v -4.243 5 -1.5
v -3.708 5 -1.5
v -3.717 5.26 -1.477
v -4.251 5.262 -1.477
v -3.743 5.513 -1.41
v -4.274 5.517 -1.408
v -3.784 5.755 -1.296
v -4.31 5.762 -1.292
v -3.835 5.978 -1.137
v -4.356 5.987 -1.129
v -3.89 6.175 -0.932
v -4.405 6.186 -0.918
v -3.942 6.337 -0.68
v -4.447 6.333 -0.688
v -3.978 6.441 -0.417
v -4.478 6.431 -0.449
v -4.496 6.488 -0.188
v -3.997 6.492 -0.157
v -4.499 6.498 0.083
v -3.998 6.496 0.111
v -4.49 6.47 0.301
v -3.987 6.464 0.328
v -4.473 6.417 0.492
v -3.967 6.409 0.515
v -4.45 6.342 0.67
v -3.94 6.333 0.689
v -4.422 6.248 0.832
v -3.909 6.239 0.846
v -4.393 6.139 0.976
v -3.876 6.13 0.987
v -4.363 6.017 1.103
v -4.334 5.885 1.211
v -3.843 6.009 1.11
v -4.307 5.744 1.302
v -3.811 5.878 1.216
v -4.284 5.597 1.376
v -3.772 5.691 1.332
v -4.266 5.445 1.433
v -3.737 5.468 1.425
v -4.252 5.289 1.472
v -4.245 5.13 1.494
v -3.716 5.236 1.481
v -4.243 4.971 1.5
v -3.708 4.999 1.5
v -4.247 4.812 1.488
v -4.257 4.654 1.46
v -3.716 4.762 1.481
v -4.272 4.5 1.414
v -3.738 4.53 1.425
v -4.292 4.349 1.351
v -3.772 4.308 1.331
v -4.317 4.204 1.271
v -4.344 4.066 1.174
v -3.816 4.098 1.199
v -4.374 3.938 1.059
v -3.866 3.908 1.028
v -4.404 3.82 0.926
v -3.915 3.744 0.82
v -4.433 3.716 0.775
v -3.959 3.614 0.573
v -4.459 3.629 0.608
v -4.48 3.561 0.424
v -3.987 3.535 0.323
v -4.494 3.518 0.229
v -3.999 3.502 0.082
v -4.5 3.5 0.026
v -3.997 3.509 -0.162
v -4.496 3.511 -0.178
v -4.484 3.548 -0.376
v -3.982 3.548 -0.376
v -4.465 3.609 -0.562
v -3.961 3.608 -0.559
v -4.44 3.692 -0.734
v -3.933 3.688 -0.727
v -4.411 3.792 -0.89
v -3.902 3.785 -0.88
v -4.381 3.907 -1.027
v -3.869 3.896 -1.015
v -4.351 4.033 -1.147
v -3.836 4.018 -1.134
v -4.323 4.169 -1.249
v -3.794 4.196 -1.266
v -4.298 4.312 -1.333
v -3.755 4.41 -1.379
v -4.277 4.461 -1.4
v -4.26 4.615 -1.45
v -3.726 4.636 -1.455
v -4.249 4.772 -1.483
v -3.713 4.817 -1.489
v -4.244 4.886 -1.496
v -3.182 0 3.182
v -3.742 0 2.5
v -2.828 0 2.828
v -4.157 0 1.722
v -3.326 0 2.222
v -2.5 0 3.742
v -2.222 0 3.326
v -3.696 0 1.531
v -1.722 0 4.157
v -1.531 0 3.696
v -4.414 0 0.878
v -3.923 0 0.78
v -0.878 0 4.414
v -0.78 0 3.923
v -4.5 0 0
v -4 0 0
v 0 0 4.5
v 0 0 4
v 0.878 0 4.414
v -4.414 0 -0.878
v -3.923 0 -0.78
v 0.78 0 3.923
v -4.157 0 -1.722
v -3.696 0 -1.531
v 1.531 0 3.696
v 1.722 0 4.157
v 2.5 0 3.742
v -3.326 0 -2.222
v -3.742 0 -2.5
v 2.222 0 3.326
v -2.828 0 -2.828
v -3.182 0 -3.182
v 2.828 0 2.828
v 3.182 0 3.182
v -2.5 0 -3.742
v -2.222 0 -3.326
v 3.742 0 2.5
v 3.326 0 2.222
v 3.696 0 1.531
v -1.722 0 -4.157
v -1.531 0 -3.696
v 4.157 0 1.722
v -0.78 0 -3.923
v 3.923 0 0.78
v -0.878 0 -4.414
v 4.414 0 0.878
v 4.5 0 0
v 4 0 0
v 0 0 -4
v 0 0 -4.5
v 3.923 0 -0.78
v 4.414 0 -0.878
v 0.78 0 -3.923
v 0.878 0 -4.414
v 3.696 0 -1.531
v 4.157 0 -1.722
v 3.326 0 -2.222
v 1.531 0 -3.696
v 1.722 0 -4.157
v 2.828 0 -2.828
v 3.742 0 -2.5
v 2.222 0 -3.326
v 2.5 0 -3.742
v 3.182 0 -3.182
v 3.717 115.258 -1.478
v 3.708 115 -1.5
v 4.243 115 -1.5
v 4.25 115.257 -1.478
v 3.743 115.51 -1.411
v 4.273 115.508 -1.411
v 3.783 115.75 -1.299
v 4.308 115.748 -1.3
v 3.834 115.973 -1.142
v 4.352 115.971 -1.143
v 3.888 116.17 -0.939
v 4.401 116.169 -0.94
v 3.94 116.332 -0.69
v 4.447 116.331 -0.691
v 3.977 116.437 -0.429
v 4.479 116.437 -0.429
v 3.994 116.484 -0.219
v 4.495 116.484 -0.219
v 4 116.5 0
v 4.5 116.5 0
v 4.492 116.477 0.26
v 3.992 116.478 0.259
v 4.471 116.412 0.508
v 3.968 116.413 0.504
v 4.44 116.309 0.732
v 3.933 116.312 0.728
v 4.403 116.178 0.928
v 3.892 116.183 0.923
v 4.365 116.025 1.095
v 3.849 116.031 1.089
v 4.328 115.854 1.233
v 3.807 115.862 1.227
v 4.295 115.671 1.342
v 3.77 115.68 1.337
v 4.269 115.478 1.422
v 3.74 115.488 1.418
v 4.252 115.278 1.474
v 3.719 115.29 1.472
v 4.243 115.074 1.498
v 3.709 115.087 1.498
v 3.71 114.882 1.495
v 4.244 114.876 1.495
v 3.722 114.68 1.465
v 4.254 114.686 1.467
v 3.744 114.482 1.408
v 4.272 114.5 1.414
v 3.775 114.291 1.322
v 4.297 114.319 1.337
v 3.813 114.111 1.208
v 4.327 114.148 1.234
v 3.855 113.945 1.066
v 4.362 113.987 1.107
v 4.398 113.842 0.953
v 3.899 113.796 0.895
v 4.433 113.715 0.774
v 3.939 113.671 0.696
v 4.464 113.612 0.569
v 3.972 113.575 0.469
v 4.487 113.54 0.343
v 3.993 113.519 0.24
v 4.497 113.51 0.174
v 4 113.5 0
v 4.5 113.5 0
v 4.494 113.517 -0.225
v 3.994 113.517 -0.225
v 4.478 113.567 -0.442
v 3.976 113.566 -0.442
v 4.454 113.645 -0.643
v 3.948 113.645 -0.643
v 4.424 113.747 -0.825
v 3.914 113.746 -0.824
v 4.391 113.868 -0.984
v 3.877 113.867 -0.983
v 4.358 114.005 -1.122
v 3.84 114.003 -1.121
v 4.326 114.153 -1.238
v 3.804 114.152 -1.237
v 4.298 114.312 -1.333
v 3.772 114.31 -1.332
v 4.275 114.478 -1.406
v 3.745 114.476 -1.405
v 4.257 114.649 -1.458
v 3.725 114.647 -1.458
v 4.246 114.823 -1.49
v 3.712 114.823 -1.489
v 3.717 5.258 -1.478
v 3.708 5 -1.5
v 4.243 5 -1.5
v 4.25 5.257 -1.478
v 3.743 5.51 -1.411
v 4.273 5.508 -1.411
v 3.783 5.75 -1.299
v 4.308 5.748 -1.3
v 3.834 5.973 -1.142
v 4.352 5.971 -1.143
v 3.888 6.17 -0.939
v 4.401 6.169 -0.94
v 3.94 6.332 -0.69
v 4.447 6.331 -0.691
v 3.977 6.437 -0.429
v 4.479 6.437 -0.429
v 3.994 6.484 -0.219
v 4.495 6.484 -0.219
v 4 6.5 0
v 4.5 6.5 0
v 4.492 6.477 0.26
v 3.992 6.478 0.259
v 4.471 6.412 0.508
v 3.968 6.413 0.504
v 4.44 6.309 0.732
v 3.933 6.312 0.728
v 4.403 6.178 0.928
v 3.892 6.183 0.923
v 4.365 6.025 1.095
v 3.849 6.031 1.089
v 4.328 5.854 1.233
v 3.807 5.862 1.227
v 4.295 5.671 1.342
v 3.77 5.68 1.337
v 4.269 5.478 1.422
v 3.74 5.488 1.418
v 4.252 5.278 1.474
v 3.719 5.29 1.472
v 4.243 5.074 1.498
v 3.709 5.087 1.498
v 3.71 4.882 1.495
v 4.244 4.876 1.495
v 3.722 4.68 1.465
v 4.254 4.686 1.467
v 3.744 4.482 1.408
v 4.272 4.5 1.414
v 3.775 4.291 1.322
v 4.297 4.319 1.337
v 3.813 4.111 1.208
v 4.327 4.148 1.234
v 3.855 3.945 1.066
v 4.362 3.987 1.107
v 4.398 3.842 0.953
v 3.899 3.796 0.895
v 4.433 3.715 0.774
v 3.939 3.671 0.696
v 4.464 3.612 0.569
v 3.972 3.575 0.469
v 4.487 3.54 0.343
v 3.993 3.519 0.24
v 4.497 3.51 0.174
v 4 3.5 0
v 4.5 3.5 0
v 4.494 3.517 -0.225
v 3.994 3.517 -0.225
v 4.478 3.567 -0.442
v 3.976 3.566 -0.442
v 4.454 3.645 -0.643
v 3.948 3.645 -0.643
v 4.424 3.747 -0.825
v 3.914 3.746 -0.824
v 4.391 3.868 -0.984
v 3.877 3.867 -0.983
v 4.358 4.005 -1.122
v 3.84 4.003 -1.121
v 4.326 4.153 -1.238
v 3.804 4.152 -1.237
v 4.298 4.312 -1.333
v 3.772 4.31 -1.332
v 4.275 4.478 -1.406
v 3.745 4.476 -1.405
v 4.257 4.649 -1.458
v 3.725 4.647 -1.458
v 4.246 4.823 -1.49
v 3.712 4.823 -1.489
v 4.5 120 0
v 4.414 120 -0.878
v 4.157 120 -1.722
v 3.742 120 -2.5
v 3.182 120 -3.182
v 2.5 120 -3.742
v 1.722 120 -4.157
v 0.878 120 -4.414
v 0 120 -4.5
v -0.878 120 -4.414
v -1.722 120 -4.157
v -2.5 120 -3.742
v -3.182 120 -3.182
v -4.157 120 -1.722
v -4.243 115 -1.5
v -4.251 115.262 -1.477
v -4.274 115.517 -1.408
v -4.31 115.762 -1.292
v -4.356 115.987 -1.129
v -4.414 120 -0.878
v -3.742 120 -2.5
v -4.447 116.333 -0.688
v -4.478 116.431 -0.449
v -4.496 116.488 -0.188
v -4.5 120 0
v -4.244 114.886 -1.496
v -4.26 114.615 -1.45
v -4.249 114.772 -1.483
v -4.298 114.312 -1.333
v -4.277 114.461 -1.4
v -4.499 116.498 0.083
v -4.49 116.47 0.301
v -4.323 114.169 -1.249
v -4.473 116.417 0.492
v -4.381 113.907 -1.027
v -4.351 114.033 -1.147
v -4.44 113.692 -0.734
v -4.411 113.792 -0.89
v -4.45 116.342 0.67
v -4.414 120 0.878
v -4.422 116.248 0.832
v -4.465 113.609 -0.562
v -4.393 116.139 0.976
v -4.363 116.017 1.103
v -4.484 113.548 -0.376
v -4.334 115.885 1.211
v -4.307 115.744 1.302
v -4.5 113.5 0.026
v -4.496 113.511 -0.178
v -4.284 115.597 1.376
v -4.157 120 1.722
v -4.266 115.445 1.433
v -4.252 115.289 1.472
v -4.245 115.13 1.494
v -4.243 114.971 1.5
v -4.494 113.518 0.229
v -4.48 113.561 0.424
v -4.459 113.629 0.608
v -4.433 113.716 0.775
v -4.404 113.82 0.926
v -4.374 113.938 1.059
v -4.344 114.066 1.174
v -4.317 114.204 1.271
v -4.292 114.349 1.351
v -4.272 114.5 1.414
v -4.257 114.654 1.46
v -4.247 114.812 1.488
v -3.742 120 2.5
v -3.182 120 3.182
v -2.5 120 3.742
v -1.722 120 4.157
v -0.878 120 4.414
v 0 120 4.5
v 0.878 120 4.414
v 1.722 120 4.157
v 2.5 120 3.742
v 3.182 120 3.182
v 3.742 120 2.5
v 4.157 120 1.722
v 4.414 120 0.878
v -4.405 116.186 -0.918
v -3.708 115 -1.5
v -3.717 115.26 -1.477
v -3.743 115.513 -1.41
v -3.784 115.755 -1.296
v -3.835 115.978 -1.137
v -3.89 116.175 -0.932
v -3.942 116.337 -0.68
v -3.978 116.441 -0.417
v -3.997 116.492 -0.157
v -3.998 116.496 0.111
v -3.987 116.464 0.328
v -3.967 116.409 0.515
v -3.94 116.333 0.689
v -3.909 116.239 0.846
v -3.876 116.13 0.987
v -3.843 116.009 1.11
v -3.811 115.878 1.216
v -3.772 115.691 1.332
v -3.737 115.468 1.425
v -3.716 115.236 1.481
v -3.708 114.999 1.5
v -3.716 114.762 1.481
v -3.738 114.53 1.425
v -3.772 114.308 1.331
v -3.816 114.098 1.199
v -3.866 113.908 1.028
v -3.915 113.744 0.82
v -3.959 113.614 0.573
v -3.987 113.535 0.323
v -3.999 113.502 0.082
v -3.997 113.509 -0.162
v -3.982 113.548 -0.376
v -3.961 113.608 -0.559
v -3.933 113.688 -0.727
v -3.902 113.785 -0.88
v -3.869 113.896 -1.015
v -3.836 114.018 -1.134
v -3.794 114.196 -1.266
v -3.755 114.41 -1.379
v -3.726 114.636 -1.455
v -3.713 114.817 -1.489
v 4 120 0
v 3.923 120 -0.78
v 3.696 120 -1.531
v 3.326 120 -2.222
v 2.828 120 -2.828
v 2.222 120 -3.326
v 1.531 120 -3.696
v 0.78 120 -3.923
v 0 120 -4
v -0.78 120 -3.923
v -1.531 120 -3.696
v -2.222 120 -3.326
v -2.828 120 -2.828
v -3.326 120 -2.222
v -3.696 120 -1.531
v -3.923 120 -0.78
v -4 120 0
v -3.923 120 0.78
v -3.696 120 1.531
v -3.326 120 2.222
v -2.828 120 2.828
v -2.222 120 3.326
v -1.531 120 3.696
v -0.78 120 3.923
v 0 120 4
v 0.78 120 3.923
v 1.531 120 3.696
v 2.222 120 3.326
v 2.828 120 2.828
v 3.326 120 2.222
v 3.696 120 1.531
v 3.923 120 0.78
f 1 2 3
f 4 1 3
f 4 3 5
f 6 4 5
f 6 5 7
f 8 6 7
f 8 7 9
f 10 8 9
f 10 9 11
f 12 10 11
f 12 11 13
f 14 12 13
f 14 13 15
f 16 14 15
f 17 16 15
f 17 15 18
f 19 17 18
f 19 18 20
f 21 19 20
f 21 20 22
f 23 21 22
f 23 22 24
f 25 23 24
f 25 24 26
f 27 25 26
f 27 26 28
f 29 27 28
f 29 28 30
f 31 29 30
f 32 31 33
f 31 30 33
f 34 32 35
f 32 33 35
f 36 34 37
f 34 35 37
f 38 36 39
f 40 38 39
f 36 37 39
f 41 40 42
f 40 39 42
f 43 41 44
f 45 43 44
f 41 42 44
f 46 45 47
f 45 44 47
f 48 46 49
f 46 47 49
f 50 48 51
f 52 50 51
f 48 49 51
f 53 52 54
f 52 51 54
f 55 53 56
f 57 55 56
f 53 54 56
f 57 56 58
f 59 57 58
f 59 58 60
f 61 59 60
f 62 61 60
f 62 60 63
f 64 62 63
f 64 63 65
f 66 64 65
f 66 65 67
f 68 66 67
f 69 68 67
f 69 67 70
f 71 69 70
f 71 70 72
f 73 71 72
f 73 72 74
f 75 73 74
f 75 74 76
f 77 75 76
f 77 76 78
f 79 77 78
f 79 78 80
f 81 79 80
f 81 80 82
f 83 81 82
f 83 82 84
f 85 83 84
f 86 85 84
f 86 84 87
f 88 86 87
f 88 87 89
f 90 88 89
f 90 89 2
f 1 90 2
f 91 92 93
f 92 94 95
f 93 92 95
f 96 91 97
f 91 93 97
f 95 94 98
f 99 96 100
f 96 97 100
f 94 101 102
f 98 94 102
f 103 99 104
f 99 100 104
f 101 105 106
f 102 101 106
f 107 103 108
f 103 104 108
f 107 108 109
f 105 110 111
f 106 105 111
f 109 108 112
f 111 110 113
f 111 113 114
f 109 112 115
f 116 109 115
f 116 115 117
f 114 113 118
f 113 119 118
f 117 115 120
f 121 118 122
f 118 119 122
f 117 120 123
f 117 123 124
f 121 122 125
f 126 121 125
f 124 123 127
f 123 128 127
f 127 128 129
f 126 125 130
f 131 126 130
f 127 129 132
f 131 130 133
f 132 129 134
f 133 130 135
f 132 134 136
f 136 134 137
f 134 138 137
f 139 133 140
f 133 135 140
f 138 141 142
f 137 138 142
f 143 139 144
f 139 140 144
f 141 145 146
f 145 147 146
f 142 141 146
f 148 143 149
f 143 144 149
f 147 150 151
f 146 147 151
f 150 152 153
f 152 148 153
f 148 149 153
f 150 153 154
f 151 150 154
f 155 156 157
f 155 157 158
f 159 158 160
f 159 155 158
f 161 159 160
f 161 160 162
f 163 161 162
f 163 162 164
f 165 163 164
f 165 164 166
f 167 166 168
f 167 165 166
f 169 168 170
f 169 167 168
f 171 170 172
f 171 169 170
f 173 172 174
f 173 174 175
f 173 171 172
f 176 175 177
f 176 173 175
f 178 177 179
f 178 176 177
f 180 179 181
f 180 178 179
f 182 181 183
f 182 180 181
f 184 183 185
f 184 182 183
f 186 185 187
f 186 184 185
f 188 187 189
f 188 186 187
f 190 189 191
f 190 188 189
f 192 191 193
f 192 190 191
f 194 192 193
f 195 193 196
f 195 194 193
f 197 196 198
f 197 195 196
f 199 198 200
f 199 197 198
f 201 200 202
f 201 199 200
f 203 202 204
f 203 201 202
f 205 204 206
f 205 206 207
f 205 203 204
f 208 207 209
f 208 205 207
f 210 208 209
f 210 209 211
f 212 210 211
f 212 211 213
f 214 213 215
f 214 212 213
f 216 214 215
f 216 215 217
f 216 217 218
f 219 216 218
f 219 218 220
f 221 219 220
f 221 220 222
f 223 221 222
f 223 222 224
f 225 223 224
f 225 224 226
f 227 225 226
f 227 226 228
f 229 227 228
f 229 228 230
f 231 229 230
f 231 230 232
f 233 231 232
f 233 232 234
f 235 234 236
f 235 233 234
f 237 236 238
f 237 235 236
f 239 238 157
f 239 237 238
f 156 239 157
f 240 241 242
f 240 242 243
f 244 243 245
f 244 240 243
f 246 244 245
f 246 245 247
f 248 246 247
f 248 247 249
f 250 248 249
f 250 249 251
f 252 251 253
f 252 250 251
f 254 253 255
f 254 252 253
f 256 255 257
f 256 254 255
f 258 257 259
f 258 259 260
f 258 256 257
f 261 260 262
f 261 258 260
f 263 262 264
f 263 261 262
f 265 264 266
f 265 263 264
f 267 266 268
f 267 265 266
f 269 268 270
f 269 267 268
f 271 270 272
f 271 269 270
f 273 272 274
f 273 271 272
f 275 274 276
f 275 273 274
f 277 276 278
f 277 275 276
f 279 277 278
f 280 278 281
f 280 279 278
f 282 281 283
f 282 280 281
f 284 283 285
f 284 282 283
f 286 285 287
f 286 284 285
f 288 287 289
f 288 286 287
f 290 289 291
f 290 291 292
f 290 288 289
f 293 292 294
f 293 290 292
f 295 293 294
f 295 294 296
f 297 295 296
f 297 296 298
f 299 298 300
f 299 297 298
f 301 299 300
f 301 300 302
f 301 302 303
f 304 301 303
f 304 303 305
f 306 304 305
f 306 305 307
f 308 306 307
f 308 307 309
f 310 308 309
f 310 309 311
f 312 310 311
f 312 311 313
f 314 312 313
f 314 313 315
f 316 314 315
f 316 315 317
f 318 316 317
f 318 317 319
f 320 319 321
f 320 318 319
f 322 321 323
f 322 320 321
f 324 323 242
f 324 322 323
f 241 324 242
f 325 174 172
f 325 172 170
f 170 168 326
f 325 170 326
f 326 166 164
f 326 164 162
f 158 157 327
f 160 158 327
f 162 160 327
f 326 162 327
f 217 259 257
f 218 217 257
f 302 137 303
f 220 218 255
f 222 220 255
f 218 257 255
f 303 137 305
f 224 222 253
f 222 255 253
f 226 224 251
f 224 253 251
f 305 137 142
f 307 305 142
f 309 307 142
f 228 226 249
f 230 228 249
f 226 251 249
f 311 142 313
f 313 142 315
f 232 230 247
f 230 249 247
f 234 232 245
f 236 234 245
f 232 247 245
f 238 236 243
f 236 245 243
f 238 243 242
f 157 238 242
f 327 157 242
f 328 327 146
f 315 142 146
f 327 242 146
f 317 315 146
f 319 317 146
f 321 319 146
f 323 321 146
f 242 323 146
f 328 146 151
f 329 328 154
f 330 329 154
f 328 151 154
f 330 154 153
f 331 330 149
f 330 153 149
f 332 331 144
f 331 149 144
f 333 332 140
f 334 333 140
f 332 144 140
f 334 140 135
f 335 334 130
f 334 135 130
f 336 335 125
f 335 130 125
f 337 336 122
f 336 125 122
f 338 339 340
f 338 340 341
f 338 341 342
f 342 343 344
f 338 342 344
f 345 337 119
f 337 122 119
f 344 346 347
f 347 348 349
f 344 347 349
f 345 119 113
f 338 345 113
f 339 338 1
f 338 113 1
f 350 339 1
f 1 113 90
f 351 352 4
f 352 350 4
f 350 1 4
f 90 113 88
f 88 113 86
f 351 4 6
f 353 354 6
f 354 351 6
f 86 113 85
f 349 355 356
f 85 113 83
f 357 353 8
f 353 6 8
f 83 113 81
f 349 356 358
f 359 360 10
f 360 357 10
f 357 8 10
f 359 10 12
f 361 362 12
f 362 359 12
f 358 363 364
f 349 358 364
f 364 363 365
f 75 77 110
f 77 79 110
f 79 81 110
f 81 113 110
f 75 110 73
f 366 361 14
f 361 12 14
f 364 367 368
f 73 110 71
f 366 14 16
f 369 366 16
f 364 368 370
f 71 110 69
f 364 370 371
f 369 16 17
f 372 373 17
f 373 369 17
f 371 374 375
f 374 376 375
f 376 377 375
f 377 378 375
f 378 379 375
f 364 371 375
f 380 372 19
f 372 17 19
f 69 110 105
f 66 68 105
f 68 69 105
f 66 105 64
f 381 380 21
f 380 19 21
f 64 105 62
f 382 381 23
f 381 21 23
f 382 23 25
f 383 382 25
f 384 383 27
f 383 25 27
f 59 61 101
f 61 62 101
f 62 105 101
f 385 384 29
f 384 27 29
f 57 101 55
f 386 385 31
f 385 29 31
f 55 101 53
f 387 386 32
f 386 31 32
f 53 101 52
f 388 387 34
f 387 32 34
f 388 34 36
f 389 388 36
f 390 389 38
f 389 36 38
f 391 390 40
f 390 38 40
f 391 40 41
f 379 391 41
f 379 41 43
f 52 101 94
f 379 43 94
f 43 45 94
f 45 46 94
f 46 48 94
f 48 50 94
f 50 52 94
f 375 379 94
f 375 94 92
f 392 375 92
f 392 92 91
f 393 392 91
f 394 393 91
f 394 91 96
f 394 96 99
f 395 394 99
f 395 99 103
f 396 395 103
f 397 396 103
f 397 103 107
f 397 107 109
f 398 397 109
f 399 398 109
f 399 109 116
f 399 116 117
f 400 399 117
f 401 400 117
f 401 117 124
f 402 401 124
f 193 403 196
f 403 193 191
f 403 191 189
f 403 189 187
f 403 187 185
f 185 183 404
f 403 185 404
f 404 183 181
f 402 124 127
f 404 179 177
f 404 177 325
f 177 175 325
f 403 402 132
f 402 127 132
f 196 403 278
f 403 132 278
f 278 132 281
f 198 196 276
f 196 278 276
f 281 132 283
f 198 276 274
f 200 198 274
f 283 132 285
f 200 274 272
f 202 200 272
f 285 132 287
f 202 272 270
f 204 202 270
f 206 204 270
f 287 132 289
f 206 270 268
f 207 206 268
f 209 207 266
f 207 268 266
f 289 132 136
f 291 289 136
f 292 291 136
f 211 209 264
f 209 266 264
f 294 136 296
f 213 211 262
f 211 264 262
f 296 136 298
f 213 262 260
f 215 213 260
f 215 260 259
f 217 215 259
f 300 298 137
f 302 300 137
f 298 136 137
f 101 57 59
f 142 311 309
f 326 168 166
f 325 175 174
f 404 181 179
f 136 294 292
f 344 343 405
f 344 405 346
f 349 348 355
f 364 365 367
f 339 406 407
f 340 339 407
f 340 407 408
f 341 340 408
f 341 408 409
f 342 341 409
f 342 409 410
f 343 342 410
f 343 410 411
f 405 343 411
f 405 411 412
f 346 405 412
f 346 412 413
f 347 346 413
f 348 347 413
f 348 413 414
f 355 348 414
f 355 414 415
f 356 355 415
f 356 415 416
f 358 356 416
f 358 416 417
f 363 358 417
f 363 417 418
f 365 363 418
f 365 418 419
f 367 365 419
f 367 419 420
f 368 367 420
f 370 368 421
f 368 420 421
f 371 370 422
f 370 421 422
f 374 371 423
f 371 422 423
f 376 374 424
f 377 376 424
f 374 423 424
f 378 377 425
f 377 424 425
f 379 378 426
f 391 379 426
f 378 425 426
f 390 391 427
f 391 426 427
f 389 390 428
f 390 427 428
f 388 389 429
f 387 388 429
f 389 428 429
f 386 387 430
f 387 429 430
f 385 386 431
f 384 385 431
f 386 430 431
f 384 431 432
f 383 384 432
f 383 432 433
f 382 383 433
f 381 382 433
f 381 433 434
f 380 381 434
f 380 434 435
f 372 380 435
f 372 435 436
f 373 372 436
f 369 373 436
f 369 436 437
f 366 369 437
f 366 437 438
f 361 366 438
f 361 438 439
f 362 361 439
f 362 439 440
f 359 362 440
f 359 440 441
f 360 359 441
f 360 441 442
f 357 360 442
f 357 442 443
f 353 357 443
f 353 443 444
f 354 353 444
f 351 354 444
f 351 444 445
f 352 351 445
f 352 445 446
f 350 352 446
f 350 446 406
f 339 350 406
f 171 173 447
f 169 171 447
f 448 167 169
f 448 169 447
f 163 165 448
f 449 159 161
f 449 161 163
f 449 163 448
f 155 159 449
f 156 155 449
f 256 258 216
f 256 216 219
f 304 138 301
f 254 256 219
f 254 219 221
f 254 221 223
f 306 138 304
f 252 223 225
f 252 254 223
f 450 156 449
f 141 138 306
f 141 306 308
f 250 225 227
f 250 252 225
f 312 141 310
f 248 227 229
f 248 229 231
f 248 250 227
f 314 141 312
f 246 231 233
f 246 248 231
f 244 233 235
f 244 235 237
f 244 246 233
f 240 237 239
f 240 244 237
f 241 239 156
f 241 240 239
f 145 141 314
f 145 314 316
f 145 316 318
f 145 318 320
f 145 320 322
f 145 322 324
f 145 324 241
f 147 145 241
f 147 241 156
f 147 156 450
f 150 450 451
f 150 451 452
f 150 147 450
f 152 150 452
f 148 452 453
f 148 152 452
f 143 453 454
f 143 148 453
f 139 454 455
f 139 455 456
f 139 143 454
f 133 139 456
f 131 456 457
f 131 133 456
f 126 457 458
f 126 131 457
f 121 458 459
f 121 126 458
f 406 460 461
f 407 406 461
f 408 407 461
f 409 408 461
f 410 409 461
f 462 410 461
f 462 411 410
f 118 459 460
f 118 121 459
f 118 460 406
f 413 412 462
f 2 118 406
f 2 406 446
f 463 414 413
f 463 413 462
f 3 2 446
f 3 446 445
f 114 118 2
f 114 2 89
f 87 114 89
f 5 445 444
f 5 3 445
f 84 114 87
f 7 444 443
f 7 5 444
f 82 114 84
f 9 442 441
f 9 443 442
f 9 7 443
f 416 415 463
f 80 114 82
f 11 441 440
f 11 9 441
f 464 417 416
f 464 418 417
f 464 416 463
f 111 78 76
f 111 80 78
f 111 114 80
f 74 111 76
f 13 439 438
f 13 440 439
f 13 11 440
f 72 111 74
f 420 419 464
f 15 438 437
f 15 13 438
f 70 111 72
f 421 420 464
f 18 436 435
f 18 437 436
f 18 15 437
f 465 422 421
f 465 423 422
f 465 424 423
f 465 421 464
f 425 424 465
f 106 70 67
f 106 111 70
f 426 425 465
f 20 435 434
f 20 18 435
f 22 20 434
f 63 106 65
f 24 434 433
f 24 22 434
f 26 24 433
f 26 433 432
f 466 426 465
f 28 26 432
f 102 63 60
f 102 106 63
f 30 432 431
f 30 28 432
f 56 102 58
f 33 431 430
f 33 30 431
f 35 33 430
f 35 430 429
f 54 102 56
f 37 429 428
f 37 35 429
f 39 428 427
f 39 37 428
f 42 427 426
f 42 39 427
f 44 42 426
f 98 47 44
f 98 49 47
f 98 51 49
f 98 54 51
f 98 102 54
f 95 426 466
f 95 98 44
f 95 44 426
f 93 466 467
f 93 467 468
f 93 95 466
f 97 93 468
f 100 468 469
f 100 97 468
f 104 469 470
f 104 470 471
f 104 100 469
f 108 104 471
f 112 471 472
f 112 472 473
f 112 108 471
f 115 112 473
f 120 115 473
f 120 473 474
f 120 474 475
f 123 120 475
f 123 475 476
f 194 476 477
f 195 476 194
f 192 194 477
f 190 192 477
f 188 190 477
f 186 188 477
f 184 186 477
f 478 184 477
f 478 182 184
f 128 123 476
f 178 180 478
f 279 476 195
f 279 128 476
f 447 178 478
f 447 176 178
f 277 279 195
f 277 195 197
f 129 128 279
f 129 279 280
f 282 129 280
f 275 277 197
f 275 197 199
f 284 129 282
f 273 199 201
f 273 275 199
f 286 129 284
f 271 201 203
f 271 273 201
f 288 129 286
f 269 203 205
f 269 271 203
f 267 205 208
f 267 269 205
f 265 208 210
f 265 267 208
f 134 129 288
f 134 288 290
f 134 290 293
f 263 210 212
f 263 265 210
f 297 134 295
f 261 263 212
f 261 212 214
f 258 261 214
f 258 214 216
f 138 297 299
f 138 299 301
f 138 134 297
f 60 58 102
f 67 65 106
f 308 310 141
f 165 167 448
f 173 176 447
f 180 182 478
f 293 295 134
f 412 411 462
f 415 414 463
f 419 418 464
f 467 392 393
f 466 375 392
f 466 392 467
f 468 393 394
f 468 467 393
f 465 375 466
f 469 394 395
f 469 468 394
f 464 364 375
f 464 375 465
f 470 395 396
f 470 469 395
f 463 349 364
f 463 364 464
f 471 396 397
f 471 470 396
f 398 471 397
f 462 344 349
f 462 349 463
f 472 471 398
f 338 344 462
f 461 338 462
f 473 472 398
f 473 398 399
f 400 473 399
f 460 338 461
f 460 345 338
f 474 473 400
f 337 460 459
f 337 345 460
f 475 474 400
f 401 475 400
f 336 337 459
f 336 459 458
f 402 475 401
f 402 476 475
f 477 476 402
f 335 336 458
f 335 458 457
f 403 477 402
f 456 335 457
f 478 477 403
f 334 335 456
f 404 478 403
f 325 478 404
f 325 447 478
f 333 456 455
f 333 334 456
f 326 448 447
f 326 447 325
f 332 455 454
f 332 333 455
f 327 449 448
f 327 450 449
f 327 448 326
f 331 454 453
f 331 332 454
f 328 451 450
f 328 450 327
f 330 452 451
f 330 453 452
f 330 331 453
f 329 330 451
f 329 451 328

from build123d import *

# Parameters (mm, degrees)
CROQUIS1_R                 = 4.5
CROQUIS1_R_2               = 4
SALIENTE_EXTRUIR1_DEPTH    = 120
CROQUIS2_R                 = 1.5
CORTAR_EXTRUIR1_DEPTH      = 5.5
CORTAR_EXTRUIR1_DEPTH_BACK = 5.5


with BuildPart() as part:
    # Croquis1 → Saliente-Extruir1 (new body)
    with BuildSketch(Plane(origin=(0, 0, 0), x_dir=(1, 0, 0), z_dir=(0, 1, 0))):
        Circle(CROQUIS1_R)
        Circle(CROQUIS1_R_2, mode=Mode.SUBTRACT)
    extrude(amount=SALIENTE_EXTRUIR1_DEPTH)

    # Croquis2 → Cortar-Extruir1 (cut, two sides)
    with BuildSketch(Plane(origin=(0, 0, 0), x_dir=(0, 0, -1), z_dir=(1, 0, 0))) as cortar_extruir1_sk:
        with Locations((0, 115)):
            Circle(CROQUIS2_R)
        with Locations((0, 5)):
            Circle(CROQUIS2_R)
    extrude(amount=CORTAR_EXTRUIR1_DEPTH, mode=Mode.SUBTRACT)
    extrude(cortar_extruir1_sk.sketch, amount=-CORTAR_EXTRUIR1_DEPTH_BACK, mode=Mode.SUBTRACT)


solid = part.part
